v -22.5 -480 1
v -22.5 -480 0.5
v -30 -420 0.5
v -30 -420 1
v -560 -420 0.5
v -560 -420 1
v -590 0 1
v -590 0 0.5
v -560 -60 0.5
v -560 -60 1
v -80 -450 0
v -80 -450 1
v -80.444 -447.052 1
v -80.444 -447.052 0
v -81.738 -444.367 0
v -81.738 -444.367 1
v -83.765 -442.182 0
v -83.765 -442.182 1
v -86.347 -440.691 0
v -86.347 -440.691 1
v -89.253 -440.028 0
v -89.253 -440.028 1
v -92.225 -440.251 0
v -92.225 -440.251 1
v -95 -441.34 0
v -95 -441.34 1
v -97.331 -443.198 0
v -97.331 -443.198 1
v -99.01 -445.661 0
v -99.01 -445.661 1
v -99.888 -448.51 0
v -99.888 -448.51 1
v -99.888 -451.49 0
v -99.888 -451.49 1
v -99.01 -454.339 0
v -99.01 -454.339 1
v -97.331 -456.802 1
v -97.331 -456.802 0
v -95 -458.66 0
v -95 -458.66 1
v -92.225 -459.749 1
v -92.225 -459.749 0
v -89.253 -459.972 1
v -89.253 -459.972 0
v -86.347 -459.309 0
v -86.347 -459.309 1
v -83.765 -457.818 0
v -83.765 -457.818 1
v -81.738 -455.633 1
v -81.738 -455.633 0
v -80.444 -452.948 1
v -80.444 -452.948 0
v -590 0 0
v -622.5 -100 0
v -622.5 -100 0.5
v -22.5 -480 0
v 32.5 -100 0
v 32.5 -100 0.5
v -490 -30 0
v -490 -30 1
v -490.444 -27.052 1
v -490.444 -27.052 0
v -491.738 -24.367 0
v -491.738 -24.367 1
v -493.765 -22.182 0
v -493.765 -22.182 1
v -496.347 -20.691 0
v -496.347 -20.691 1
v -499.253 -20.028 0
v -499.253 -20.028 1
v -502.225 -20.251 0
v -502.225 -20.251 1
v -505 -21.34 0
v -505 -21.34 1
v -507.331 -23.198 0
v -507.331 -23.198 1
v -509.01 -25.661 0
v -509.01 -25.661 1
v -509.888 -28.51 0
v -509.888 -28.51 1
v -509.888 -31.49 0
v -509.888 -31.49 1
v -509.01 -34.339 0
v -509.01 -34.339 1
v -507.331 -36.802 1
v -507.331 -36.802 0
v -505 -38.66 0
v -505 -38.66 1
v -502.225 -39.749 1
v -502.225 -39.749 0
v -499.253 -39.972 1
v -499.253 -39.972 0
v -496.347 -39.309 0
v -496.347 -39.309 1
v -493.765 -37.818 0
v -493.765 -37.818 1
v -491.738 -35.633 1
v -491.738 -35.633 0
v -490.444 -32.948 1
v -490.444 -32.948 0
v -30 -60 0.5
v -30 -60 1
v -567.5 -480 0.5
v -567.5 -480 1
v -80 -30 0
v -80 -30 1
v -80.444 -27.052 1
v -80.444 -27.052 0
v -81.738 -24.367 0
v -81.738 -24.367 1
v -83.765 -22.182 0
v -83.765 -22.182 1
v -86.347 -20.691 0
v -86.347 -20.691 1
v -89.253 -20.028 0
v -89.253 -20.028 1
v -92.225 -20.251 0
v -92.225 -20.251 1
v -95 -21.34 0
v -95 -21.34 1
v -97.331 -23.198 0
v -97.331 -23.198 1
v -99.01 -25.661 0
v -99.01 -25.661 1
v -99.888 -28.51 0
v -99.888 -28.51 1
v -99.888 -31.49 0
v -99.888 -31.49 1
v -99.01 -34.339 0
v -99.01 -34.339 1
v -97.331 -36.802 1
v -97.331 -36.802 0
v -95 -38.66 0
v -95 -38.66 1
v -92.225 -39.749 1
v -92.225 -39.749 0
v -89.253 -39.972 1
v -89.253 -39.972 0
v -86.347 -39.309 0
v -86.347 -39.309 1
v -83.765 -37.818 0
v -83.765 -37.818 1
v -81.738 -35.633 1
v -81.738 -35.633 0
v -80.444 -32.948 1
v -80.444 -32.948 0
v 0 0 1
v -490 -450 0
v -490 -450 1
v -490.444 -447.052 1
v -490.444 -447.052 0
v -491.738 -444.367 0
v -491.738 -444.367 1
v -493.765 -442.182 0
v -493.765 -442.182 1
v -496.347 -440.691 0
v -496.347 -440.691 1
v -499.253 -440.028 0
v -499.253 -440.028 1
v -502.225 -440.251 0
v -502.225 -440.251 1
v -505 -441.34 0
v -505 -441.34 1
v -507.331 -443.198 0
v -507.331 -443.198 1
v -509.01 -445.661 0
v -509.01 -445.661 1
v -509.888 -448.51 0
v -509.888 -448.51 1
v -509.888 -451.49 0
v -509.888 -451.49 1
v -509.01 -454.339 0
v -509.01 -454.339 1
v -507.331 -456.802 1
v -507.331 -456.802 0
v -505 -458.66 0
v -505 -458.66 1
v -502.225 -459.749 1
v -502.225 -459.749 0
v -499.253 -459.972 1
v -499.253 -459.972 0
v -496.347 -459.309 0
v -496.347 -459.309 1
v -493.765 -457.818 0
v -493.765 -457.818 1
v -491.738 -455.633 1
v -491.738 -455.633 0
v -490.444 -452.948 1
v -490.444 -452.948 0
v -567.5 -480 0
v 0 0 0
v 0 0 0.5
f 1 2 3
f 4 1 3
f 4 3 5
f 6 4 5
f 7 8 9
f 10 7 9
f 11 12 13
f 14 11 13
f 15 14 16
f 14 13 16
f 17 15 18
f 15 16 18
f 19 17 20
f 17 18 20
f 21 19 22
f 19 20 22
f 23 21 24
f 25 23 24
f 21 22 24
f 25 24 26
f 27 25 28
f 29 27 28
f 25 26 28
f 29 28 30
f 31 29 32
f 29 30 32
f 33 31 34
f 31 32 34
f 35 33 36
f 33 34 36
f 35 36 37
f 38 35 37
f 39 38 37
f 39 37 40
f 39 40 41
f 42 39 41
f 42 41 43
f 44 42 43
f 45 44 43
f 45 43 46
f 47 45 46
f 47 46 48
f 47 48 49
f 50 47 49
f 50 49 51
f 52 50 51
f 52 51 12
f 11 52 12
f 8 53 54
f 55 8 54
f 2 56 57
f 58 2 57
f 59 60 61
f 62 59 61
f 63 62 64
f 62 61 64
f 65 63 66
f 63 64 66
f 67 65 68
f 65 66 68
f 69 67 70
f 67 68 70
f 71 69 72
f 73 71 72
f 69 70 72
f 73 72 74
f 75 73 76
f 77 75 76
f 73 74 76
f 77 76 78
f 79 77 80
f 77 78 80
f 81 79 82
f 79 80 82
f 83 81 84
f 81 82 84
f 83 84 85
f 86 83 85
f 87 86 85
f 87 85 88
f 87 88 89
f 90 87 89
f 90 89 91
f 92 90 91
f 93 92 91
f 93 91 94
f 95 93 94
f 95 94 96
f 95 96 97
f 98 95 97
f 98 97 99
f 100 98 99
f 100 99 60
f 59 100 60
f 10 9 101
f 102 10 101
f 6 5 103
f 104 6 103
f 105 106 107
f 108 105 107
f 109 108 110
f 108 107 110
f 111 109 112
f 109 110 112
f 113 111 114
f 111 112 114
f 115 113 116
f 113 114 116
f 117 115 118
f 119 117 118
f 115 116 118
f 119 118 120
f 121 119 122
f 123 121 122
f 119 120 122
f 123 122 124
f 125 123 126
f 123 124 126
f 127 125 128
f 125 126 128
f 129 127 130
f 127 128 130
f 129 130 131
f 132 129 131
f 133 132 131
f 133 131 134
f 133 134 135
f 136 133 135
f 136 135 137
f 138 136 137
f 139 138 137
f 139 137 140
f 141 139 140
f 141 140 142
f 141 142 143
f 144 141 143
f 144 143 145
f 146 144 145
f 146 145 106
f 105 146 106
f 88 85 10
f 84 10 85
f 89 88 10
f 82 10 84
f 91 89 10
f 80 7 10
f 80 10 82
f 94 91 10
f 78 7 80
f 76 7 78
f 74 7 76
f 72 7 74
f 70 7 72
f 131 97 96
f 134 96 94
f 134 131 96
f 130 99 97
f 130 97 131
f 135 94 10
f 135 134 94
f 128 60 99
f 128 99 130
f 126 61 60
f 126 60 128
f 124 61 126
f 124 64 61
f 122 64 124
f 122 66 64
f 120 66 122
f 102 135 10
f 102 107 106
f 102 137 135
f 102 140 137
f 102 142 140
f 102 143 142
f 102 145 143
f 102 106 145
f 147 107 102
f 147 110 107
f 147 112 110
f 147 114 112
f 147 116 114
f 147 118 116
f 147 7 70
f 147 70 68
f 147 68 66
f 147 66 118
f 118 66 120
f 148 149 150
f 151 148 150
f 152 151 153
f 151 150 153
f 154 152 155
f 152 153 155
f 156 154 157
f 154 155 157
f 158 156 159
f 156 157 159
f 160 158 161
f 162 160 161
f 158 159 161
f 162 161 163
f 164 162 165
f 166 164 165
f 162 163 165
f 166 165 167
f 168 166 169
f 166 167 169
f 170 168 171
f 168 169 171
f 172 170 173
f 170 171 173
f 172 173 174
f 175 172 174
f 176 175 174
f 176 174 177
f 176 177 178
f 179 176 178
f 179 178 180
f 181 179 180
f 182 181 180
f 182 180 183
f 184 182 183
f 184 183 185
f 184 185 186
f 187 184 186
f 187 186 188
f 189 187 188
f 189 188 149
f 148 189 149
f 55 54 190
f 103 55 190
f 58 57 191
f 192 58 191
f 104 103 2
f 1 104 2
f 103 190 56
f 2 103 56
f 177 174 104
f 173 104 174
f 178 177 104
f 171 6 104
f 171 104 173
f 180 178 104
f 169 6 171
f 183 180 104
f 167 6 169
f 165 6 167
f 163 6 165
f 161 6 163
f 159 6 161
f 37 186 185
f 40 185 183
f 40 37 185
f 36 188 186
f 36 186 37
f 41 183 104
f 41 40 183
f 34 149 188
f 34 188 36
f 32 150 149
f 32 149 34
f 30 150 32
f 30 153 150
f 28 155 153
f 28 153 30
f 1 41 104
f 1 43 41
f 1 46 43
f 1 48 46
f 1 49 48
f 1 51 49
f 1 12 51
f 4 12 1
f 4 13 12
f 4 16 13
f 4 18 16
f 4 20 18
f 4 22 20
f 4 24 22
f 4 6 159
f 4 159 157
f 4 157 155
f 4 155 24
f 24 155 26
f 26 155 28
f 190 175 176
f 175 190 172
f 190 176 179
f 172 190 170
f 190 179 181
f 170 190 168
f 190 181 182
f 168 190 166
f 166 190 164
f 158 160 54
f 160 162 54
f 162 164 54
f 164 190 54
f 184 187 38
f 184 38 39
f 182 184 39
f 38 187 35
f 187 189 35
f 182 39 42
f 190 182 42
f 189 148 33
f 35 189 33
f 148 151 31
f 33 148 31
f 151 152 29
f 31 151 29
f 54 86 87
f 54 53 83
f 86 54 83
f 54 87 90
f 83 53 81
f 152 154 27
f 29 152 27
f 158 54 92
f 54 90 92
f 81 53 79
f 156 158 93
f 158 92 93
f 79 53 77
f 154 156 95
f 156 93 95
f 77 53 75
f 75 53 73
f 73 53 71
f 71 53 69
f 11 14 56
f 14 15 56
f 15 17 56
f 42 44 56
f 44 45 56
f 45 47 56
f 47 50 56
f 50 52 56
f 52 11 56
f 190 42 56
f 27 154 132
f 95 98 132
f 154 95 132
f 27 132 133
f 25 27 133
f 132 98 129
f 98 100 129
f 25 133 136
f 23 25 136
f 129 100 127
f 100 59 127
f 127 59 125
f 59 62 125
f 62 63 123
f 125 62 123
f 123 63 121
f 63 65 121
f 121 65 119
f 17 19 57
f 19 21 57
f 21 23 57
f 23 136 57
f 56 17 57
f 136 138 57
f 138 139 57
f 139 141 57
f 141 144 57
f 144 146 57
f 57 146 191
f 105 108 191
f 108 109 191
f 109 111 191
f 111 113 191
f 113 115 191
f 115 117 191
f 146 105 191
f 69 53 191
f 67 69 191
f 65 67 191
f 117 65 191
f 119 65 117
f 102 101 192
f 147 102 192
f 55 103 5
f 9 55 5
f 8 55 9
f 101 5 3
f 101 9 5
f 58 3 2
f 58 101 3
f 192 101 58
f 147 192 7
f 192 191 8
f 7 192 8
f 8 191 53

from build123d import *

# Parameters (mm, degrees)
F1_DEPTH = 0.5
F3_DEPTH = 0.5
F4_R     = 10
F5_DEPTH = 1.001


with BuildPart() as f1:
    # F0 (on Top) → F1 (new body)
    with BuildSketch(Plane.XY):
        Polygon((0, 0), (-590, 0), (-622.5, -100), (-567.5, -480), (-22.5, -480), (32.5, -100), align=None)
    extrude(amount=F1_DEPTH)

    # F2 (on face) → F3 (join)
    with BuildSketch(Plane.XY.offset(0.5)):
        Polygon((0, 0), (-590, 0), (-560, -60), (-30, -60), align=None)
        Polygon((-567.5, -480), (-22.5, -480), (-30, -420), (-560, -420), align=None)
    extrude(amount=F3_DEPTH)

    # F4 (on face) → F5 (cut, through all)
    with BuildSketch(Plane.XY.offset(1)):
        with Locations((-500, -30)):
            Circle(F4_R)
        with Locations((-500, -450)):
            Circle(F4_R)
        with Locations((-90, -30)):
            Circle(F4_R)
        with Locations((-90, -450)):
            Circle(F4_R)
    extrude(amount=-F5_DEPTH, mode=Mode.SUBTRACT)


solid = f1.part
